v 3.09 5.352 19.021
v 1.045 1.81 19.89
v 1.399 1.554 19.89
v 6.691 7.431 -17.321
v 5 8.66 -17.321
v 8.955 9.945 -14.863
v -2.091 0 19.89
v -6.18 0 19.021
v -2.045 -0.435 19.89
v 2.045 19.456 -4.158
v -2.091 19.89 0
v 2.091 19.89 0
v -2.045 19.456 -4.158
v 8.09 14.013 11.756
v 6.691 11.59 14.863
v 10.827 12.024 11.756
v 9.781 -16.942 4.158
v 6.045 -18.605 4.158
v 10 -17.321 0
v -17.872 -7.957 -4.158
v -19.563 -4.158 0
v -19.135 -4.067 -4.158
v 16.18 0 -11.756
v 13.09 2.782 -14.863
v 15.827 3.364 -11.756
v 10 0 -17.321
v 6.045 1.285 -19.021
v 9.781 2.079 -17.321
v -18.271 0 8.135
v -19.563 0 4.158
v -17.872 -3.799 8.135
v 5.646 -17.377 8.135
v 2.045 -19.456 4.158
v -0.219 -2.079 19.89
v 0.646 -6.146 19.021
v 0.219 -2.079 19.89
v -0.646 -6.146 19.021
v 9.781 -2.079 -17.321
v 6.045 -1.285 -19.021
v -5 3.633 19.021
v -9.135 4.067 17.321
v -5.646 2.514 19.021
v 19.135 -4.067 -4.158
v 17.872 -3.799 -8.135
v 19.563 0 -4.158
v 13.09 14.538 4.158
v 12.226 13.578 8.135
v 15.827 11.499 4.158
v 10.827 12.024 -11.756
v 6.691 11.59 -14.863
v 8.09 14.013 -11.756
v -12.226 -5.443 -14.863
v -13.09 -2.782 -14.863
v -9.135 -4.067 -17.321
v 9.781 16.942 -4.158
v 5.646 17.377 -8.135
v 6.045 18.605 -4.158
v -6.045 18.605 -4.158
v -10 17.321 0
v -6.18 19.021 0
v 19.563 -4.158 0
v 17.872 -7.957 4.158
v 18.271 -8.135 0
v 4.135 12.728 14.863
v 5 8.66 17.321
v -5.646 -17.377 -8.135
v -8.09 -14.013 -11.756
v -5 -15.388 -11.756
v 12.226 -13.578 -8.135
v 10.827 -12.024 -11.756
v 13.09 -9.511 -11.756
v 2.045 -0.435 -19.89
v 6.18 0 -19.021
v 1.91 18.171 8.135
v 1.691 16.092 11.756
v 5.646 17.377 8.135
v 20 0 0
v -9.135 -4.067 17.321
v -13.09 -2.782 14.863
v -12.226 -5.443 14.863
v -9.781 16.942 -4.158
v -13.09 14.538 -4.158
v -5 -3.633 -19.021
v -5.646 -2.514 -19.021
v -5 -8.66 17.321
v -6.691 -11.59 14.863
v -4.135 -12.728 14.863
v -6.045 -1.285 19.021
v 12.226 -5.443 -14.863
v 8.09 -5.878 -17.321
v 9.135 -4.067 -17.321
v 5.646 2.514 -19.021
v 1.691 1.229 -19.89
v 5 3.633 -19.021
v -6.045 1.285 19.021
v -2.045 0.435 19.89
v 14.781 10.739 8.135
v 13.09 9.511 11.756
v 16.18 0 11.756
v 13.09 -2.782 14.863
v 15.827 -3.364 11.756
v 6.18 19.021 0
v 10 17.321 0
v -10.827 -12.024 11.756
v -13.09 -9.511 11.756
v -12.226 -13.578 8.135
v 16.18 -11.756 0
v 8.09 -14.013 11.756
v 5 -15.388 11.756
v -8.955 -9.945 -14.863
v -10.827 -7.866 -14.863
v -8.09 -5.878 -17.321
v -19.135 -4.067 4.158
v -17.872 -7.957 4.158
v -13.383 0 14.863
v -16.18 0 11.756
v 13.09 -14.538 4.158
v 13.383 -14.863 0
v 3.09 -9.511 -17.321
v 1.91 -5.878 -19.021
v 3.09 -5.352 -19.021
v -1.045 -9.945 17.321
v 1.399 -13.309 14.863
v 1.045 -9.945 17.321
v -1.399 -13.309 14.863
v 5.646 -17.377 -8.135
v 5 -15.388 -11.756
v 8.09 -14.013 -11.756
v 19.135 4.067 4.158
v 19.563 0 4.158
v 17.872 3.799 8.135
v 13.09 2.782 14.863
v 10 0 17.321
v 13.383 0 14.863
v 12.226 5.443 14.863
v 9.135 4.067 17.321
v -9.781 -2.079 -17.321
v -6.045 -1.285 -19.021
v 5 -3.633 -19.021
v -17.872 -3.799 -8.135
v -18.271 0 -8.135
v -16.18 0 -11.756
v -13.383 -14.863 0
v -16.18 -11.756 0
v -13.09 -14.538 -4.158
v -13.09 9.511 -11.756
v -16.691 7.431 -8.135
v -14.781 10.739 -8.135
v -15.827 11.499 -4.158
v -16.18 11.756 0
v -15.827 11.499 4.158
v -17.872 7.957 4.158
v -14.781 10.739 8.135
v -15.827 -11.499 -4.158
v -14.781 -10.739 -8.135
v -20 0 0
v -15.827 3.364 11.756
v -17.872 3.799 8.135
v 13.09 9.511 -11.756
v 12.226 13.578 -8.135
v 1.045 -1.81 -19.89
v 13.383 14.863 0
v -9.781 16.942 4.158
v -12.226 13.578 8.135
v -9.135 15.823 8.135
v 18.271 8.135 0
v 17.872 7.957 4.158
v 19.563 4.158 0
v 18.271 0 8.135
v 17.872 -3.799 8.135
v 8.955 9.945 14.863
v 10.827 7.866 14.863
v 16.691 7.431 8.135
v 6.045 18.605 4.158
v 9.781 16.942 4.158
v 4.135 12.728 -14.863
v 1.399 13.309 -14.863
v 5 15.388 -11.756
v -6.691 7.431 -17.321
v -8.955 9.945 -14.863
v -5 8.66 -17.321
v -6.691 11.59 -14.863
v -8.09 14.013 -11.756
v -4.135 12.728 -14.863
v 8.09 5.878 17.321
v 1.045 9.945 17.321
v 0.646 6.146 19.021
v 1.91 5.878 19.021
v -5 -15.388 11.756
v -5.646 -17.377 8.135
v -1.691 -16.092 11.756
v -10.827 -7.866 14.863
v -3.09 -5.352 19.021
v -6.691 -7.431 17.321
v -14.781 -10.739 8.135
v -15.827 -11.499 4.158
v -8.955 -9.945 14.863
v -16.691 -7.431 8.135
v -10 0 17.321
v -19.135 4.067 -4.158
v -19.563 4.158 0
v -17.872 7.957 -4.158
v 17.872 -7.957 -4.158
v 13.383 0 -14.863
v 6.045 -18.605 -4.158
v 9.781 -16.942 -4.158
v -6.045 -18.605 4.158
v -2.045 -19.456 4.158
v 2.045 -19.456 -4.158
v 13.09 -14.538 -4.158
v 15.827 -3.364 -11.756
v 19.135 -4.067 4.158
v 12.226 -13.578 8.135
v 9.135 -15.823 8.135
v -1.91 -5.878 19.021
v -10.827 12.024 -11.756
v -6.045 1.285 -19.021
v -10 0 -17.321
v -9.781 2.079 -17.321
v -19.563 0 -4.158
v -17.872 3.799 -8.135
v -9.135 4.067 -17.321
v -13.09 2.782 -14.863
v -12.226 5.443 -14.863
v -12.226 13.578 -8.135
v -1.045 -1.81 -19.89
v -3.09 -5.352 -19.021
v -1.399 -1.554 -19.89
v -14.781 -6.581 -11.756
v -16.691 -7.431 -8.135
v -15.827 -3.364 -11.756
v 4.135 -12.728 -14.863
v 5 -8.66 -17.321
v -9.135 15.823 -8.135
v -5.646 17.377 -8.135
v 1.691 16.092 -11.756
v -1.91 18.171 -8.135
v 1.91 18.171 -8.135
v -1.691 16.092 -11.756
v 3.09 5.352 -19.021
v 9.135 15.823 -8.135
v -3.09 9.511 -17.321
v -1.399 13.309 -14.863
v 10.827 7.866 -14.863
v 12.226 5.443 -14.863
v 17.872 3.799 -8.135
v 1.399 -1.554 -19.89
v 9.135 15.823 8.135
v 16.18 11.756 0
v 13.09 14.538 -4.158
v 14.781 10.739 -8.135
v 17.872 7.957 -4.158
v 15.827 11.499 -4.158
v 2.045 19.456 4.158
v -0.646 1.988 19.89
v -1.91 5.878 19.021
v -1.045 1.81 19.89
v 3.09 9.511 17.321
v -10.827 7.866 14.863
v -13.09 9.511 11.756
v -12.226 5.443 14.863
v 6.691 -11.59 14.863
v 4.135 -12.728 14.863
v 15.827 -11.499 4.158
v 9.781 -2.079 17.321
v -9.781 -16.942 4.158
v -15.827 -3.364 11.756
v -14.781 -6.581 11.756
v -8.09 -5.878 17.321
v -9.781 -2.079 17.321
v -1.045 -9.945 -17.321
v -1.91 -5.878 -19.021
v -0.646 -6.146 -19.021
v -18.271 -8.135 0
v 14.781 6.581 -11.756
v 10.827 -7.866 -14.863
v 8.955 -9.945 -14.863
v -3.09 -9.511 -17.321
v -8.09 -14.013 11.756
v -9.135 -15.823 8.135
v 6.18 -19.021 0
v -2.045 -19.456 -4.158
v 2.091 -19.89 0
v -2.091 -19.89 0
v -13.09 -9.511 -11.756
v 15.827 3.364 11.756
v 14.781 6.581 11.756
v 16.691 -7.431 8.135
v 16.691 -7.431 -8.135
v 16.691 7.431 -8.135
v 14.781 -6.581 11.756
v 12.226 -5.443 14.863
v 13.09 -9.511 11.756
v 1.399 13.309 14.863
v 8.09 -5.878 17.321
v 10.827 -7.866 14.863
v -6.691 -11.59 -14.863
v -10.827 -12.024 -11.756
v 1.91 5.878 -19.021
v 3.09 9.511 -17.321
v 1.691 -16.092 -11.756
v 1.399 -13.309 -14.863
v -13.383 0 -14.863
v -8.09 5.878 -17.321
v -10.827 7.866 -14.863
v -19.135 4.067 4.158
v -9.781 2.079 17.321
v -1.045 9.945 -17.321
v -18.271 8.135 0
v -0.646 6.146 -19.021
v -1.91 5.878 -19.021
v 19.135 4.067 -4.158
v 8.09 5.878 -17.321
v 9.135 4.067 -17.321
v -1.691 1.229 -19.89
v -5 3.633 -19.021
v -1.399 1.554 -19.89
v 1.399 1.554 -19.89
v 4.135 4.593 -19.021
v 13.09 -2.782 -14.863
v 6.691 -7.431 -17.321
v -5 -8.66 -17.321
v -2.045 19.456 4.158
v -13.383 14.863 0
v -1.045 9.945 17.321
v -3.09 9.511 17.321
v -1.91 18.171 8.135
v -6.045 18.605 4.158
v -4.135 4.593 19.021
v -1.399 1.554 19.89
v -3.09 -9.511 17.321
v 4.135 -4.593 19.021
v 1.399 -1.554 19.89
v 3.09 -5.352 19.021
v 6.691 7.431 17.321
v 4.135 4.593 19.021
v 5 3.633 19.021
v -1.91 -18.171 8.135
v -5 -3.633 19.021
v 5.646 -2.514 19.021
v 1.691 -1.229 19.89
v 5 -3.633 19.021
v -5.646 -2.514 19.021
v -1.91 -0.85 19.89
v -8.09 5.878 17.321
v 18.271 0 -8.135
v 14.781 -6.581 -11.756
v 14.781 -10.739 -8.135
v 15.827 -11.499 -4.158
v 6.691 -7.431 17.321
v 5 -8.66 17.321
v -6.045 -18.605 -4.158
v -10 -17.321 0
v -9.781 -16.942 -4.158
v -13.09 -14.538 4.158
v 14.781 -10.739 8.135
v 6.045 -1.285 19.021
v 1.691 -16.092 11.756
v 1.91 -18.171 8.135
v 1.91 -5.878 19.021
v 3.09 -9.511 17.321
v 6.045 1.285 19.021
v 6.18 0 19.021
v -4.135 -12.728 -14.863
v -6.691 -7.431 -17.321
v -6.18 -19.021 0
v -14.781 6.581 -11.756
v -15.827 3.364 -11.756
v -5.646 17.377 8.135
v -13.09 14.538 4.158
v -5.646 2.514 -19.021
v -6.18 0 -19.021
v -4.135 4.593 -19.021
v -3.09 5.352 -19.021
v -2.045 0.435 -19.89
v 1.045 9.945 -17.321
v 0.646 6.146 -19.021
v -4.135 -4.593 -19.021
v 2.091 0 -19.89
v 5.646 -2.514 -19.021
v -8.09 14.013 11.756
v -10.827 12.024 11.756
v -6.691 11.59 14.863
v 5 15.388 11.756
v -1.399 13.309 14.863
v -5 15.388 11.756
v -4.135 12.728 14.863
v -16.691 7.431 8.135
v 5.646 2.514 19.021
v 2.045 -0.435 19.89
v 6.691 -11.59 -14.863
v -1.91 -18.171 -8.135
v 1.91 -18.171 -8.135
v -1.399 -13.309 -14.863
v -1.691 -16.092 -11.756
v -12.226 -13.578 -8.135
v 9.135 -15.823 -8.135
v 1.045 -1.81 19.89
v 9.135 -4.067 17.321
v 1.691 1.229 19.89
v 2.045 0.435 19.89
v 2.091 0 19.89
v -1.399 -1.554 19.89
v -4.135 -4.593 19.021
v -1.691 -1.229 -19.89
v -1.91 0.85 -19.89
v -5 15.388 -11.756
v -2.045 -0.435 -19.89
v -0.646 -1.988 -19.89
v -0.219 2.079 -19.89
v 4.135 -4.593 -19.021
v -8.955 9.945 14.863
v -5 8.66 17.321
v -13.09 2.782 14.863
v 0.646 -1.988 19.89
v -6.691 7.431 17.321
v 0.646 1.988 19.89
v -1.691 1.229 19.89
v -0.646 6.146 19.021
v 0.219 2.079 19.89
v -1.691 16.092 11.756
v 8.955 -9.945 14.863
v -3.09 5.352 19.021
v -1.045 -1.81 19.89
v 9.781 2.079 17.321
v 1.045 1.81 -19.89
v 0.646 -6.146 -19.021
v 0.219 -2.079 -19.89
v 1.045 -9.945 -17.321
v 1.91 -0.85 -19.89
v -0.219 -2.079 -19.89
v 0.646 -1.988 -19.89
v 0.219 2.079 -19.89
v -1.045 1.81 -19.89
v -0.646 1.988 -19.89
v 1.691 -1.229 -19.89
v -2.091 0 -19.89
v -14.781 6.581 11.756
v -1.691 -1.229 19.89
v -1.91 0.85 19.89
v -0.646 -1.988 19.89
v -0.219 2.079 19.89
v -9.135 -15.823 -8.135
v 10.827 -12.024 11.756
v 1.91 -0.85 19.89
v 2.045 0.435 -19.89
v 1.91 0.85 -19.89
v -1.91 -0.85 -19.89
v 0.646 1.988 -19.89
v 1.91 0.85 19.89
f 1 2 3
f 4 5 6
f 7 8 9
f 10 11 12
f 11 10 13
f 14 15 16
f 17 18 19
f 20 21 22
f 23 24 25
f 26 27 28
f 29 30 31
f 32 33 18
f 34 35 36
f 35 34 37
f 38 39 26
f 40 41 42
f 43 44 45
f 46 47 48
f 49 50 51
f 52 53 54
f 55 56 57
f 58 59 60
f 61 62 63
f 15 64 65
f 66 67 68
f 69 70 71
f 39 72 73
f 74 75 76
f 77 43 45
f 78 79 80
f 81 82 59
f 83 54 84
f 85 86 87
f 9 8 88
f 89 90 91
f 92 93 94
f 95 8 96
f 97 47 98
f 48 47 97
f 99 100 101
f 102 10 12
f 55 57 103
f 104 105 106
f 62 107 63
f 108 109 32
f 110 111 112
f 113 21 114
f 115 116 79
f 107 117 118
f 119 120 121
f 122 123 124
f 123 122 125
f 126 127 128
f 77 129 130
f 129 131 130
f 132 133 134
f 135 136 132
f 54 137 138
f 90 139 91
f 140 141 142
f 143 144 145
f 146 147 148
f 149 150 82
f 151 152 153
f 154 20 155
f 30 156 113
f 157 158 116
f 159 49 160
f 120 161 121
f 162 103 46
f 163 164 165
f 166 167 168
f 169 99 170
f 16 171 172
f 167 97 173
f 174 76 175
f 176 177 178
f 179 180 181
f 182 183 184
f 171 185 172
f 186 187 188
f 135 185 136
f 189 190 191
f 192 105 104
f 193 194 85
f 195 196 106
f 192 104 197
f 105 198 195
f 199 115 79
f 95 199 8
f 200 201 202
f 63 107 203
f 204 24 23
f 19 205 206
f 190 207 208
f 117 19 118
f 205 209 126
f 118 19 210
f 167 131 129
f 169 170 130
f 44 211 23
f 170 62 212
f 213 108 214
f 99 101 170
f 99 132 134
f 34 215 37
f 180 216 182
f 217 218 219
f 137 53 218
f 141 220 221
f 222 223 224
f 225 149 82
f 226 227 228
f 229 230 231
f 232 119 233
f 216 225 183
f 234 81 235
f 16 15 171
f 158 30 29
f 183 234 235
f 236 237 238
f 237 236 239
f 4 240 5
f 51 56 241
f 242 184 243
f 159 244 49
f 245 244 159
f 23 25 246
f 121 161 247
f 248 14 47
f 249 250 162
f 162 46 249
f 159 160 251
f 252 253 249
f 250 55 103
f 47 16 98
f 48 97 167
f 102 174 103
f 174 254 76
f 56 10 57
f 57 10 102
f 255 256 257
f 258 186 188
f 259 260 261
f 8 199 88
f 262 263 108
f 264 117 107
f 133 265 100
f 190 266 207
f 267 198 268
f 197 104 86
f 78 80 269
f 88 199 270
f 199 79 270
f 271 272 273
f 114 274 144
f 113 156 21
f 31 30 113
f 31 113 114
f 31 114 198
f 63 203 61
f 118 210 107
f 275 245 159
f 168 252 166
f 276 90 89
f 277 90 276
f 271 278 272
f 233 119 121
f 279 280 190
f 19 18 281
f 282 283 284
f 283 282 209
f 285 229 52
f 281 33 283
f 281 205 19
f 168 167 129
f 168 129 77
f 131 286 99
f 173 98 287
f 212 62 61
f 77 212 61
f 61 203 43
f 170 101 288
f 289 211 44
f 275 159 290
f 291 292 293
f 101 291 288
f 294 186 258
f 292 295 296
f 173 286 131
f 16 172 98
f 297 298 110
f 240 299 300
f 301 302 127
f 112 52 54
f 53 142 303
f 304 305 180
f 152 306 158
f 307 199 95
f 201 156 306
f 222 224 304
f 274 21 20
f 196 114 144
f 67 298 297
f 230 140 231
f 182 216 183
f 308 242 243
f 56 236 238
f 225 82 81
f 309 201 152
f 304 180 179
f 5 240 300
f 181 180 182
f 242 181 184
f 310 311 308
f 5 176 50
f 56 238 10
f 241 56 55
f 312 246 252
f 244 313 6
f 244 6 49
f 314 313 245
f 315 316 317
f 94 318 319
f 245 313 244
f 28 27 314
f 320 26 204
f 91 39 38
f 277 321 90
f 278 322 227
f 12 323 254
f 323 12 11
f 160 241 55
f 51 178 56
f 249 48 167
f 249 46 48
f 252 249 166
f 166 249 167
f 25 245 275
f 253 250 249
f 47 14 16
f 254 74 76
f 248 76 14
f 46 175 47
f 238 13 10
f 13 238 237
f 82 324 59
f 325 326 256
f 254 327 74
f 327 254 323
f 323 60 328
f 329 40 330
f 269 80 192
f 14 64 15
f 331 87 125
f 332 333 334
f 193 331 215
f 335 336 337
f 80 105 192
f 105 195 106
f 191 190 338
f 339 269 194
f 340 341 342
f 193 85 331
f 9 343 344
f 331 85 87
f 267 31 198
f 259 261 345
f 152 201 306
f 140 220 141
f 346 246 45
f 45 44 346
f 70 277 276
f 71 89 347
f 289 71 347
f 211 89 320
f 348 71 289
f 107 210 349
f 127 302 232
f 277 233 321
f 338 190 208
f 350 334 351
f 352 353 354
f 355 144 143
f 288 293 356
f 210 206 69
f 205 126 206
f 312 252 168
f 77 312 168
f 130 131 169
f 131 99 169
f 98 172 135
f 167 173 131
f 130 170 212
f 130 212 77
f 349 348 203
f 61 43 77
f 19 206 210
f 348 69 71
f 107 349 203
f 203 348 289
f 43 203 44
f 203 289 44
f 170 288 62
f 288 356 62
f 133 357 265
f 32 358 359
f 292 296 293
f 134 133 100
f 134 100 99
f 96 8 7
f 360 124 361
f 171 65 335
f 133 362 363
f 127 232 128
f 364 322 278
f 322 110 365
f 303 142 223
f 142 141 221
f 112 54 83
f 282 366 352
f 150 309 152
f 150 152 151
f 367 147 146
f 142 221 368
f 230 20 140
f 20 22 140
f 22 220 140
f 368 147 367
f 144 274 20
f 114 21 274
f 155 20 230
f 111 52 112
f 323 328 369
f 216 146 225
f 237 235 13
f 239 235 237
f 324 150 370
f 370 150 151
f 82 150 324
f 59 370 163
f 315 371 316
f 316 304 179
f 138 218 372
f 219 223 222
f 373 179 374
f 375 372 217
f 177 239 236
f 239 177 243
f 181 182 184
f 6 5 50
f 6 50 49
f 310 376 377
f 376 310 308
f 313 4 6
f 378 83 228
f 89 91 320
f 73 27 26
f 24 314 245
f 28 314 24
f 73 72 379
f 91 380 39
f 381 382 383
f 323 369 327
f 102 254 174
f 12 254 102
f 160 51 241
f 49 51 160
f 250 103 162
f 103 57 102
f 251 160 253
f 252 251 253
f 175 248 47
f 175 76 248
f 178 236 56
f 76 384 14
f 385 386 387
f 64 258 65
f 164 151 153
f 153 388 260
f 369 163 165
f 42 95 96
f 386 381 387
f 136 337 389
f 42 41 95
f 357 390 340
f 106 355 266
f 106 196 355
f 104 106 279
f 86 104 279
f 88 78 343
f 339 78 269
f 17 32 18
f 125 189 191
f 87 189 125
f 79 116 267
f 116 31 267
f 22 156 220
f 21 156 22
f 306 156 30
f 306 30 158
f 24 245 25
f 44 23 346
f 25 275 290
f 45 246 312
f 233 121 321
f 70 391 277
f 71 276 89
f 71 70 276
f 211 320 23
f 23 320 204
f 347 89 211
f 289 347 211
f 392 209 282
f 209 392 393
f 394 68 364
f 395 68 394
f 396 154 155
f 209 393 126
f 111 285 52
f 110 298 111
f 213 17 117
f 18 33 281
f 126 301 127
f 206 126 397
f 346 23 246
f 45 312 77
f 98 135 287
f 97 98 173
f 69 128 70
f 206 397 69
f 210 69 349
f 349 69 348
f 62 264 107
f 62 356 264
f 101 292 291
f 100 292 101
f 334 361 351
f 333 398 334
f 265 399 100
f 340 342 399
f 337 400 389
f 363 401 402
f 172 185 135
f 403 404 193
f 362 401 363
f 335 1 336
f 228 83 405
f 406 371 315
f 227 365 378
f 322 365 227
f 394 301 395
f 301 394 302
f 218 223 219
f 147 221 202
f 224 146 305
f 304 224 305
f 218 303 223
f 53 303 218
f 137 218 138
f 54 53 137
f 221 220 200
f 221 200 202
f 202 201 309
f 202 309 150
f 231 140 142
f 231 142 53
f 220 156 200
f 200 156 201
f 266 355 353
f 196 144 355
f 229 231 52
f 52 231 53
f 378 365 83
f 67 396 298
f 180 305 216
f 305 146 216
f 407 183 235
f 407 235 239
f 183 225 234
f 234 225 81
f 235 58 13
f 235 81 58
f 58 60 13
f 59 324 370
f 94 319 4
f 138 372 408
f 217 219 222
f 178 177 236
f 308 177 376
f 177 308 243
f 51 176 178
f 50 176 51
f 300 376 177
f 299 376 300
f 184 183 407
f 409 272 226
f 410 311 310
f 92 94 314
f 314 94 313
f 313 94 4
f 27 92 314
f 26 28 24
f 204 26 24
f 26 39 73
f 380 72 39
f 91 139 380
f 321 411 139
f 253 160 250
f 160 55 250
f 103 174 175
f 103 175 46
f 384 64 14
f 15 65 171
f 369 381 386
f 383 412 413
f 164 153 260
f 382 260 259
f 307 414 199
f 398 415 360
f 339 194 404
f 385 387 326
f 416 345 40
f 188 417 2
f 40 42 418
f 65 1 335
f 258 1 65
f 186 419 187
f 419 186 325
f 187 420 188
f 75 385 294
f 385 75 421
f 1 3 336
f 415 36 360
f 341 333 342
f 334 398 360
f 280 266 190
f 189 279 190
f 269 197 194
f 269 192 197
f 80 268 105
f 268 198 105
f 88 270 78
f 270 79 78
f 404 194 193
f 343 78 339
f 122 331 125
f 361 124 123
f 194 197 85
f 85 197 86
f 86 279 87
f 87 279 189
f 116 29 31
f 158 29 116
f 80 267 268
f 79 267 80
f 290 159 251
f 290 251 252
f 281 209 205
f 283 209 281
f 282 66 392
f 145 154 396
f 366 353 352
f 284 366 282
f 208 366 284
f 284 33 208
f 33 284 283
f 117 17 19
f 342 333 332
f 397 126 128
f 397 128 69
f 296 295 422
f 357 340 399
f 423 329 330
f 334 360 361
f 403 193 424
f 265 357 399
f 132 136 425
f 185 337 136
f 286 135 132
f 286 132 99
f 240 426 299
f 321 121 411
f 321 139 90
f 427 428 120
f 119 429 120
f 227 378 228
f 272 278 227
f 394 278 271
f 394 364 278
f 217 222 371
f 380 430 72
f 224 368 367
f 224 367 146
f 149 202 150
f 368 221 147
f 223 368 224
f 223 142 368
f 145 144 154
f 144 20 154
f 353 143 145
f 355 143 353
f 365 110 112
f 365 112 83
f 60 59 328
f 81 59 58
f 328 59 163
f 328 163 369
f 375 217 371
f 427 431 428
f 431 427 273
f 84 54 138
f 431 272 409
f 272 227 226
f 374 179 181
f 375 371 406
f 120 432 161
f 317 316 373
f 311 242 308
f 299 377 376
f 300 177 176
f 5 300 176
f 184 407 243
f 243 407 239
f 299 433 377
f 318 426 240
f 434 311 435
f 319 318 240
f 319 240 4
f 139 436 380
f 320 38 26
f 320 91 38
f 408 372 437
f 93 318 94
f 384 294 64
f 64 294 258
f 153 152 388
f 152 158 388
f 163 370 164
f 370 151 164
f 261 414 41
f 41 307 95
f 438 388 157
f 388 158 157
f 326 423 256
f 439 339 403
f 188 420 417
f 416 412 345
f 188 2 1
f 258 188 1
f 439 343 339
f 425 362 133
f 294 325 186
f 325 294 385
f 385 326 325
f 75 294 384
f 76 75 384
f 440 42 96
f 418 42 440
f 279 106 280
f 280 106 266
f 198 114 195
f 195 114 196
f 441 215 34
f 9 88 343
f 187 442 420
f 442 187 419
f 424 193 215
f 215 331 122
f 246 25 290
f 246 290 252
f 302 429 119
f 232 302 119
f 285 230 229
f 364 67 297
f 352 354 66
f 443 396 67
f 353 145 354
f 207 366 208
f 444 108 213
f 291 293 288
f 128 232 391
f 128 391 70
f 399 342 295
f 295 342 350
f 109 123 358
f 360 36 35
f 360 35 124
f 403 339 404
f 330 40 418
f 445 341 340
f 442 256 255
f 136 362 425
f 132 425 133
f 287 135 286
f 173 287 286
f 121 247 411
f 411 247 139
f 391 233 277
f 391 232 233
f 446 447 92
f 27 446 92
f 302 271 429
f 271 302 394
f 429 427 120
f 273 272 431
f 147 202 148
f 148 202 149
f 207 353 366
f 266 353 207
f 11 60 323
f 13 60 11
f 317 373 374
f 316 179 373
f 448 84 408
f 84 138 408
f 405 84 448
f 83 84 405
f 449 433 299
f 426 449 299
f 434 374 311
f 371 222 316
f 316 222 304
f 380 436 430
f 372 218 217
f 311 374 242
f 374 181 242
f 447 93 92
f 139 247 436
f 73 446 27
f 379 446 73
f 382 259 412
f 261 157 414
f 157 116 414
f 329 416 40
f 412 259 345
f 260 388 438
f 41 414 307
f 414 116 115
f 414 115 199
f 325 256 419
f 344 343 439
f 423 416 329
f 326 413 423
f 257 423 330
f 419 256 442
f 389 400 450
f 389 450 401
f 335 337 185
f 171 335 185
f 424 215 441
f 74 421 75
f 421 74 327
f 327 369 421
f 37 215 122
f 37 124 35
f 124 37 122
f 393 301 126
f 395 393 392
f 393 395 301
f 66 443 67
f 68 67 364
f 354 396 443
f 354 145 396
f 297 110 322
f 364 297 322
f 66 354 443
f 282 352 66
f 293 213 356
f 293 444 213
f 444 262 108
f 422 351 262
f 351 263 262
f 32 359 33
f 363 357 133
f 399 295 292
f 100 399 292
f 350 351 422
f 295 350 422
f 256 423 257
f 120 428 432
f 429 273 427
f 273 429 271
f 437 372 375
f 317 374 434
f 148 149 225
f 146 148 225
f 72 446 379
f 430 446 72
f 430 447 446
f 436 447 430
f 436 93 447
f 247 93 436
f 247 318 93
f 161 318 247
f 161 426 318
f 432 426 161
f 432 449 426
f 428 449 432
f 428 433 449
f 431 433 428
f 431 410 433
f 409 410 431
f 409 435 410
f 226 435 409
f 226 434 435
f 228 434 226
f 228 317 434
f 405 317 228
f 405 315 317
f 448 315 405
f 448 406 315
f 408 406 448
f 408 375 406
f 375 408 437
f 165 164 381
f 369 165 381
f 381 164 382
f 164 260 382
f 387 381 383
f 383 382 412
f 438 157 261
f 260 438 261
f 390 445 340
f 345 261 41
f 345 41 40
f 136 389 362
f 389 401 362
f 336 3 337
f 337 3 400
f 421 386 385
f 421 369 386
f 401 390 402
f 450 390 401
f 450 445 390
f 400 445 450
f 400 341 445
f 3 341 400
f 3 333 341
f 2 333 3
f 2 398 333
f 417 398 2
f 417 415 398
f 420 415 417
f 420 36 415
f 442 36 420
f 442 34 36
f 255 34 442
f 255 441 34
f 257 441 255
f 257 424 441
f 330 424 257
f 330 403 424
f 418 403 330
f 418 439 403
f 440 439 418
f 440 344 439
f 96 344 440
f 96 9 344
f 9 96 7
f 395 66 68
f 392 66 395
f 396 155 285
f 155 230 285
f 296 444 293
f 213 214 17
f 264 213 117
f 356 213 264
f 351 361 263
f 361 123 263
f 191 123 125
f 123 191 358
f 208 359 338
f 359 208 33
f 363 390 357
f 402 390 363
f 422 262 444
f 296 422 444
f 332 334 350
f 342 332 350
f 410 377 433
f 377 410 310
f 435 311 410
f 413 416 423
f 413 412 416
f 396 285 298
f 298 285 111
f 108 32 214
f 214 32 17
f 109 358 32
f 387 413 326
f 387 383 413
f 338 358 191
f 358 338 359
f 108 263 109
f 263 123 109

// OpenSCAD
// file: inc4.scad
a = 4;

module foo(r) {
  sphere (a*r);
}
foo(5);
// file: inc3.scad
include <inc4.scad>

a = 4;

module foo(r) {
  sphere (a*r);
}
foo(5);
// file: inc5.scad
a = 4;

module foo(r) {
  sphere (a*r);
}
foo(5);
// file: inc2.scad
include <inc4.scad>

a = 4;

module foo(r) {
  sphere (a*r);
}
foo(5);
// file: myLib.scad
include <inc3.scad>
include <inc4.scad>

a = 4;

module foo(r) {
  sphere (a*r);
}
foo(5);
// main file
include <myLib.scad>
include <inc2.scad>
include <inc5.scad>

foo(5);
